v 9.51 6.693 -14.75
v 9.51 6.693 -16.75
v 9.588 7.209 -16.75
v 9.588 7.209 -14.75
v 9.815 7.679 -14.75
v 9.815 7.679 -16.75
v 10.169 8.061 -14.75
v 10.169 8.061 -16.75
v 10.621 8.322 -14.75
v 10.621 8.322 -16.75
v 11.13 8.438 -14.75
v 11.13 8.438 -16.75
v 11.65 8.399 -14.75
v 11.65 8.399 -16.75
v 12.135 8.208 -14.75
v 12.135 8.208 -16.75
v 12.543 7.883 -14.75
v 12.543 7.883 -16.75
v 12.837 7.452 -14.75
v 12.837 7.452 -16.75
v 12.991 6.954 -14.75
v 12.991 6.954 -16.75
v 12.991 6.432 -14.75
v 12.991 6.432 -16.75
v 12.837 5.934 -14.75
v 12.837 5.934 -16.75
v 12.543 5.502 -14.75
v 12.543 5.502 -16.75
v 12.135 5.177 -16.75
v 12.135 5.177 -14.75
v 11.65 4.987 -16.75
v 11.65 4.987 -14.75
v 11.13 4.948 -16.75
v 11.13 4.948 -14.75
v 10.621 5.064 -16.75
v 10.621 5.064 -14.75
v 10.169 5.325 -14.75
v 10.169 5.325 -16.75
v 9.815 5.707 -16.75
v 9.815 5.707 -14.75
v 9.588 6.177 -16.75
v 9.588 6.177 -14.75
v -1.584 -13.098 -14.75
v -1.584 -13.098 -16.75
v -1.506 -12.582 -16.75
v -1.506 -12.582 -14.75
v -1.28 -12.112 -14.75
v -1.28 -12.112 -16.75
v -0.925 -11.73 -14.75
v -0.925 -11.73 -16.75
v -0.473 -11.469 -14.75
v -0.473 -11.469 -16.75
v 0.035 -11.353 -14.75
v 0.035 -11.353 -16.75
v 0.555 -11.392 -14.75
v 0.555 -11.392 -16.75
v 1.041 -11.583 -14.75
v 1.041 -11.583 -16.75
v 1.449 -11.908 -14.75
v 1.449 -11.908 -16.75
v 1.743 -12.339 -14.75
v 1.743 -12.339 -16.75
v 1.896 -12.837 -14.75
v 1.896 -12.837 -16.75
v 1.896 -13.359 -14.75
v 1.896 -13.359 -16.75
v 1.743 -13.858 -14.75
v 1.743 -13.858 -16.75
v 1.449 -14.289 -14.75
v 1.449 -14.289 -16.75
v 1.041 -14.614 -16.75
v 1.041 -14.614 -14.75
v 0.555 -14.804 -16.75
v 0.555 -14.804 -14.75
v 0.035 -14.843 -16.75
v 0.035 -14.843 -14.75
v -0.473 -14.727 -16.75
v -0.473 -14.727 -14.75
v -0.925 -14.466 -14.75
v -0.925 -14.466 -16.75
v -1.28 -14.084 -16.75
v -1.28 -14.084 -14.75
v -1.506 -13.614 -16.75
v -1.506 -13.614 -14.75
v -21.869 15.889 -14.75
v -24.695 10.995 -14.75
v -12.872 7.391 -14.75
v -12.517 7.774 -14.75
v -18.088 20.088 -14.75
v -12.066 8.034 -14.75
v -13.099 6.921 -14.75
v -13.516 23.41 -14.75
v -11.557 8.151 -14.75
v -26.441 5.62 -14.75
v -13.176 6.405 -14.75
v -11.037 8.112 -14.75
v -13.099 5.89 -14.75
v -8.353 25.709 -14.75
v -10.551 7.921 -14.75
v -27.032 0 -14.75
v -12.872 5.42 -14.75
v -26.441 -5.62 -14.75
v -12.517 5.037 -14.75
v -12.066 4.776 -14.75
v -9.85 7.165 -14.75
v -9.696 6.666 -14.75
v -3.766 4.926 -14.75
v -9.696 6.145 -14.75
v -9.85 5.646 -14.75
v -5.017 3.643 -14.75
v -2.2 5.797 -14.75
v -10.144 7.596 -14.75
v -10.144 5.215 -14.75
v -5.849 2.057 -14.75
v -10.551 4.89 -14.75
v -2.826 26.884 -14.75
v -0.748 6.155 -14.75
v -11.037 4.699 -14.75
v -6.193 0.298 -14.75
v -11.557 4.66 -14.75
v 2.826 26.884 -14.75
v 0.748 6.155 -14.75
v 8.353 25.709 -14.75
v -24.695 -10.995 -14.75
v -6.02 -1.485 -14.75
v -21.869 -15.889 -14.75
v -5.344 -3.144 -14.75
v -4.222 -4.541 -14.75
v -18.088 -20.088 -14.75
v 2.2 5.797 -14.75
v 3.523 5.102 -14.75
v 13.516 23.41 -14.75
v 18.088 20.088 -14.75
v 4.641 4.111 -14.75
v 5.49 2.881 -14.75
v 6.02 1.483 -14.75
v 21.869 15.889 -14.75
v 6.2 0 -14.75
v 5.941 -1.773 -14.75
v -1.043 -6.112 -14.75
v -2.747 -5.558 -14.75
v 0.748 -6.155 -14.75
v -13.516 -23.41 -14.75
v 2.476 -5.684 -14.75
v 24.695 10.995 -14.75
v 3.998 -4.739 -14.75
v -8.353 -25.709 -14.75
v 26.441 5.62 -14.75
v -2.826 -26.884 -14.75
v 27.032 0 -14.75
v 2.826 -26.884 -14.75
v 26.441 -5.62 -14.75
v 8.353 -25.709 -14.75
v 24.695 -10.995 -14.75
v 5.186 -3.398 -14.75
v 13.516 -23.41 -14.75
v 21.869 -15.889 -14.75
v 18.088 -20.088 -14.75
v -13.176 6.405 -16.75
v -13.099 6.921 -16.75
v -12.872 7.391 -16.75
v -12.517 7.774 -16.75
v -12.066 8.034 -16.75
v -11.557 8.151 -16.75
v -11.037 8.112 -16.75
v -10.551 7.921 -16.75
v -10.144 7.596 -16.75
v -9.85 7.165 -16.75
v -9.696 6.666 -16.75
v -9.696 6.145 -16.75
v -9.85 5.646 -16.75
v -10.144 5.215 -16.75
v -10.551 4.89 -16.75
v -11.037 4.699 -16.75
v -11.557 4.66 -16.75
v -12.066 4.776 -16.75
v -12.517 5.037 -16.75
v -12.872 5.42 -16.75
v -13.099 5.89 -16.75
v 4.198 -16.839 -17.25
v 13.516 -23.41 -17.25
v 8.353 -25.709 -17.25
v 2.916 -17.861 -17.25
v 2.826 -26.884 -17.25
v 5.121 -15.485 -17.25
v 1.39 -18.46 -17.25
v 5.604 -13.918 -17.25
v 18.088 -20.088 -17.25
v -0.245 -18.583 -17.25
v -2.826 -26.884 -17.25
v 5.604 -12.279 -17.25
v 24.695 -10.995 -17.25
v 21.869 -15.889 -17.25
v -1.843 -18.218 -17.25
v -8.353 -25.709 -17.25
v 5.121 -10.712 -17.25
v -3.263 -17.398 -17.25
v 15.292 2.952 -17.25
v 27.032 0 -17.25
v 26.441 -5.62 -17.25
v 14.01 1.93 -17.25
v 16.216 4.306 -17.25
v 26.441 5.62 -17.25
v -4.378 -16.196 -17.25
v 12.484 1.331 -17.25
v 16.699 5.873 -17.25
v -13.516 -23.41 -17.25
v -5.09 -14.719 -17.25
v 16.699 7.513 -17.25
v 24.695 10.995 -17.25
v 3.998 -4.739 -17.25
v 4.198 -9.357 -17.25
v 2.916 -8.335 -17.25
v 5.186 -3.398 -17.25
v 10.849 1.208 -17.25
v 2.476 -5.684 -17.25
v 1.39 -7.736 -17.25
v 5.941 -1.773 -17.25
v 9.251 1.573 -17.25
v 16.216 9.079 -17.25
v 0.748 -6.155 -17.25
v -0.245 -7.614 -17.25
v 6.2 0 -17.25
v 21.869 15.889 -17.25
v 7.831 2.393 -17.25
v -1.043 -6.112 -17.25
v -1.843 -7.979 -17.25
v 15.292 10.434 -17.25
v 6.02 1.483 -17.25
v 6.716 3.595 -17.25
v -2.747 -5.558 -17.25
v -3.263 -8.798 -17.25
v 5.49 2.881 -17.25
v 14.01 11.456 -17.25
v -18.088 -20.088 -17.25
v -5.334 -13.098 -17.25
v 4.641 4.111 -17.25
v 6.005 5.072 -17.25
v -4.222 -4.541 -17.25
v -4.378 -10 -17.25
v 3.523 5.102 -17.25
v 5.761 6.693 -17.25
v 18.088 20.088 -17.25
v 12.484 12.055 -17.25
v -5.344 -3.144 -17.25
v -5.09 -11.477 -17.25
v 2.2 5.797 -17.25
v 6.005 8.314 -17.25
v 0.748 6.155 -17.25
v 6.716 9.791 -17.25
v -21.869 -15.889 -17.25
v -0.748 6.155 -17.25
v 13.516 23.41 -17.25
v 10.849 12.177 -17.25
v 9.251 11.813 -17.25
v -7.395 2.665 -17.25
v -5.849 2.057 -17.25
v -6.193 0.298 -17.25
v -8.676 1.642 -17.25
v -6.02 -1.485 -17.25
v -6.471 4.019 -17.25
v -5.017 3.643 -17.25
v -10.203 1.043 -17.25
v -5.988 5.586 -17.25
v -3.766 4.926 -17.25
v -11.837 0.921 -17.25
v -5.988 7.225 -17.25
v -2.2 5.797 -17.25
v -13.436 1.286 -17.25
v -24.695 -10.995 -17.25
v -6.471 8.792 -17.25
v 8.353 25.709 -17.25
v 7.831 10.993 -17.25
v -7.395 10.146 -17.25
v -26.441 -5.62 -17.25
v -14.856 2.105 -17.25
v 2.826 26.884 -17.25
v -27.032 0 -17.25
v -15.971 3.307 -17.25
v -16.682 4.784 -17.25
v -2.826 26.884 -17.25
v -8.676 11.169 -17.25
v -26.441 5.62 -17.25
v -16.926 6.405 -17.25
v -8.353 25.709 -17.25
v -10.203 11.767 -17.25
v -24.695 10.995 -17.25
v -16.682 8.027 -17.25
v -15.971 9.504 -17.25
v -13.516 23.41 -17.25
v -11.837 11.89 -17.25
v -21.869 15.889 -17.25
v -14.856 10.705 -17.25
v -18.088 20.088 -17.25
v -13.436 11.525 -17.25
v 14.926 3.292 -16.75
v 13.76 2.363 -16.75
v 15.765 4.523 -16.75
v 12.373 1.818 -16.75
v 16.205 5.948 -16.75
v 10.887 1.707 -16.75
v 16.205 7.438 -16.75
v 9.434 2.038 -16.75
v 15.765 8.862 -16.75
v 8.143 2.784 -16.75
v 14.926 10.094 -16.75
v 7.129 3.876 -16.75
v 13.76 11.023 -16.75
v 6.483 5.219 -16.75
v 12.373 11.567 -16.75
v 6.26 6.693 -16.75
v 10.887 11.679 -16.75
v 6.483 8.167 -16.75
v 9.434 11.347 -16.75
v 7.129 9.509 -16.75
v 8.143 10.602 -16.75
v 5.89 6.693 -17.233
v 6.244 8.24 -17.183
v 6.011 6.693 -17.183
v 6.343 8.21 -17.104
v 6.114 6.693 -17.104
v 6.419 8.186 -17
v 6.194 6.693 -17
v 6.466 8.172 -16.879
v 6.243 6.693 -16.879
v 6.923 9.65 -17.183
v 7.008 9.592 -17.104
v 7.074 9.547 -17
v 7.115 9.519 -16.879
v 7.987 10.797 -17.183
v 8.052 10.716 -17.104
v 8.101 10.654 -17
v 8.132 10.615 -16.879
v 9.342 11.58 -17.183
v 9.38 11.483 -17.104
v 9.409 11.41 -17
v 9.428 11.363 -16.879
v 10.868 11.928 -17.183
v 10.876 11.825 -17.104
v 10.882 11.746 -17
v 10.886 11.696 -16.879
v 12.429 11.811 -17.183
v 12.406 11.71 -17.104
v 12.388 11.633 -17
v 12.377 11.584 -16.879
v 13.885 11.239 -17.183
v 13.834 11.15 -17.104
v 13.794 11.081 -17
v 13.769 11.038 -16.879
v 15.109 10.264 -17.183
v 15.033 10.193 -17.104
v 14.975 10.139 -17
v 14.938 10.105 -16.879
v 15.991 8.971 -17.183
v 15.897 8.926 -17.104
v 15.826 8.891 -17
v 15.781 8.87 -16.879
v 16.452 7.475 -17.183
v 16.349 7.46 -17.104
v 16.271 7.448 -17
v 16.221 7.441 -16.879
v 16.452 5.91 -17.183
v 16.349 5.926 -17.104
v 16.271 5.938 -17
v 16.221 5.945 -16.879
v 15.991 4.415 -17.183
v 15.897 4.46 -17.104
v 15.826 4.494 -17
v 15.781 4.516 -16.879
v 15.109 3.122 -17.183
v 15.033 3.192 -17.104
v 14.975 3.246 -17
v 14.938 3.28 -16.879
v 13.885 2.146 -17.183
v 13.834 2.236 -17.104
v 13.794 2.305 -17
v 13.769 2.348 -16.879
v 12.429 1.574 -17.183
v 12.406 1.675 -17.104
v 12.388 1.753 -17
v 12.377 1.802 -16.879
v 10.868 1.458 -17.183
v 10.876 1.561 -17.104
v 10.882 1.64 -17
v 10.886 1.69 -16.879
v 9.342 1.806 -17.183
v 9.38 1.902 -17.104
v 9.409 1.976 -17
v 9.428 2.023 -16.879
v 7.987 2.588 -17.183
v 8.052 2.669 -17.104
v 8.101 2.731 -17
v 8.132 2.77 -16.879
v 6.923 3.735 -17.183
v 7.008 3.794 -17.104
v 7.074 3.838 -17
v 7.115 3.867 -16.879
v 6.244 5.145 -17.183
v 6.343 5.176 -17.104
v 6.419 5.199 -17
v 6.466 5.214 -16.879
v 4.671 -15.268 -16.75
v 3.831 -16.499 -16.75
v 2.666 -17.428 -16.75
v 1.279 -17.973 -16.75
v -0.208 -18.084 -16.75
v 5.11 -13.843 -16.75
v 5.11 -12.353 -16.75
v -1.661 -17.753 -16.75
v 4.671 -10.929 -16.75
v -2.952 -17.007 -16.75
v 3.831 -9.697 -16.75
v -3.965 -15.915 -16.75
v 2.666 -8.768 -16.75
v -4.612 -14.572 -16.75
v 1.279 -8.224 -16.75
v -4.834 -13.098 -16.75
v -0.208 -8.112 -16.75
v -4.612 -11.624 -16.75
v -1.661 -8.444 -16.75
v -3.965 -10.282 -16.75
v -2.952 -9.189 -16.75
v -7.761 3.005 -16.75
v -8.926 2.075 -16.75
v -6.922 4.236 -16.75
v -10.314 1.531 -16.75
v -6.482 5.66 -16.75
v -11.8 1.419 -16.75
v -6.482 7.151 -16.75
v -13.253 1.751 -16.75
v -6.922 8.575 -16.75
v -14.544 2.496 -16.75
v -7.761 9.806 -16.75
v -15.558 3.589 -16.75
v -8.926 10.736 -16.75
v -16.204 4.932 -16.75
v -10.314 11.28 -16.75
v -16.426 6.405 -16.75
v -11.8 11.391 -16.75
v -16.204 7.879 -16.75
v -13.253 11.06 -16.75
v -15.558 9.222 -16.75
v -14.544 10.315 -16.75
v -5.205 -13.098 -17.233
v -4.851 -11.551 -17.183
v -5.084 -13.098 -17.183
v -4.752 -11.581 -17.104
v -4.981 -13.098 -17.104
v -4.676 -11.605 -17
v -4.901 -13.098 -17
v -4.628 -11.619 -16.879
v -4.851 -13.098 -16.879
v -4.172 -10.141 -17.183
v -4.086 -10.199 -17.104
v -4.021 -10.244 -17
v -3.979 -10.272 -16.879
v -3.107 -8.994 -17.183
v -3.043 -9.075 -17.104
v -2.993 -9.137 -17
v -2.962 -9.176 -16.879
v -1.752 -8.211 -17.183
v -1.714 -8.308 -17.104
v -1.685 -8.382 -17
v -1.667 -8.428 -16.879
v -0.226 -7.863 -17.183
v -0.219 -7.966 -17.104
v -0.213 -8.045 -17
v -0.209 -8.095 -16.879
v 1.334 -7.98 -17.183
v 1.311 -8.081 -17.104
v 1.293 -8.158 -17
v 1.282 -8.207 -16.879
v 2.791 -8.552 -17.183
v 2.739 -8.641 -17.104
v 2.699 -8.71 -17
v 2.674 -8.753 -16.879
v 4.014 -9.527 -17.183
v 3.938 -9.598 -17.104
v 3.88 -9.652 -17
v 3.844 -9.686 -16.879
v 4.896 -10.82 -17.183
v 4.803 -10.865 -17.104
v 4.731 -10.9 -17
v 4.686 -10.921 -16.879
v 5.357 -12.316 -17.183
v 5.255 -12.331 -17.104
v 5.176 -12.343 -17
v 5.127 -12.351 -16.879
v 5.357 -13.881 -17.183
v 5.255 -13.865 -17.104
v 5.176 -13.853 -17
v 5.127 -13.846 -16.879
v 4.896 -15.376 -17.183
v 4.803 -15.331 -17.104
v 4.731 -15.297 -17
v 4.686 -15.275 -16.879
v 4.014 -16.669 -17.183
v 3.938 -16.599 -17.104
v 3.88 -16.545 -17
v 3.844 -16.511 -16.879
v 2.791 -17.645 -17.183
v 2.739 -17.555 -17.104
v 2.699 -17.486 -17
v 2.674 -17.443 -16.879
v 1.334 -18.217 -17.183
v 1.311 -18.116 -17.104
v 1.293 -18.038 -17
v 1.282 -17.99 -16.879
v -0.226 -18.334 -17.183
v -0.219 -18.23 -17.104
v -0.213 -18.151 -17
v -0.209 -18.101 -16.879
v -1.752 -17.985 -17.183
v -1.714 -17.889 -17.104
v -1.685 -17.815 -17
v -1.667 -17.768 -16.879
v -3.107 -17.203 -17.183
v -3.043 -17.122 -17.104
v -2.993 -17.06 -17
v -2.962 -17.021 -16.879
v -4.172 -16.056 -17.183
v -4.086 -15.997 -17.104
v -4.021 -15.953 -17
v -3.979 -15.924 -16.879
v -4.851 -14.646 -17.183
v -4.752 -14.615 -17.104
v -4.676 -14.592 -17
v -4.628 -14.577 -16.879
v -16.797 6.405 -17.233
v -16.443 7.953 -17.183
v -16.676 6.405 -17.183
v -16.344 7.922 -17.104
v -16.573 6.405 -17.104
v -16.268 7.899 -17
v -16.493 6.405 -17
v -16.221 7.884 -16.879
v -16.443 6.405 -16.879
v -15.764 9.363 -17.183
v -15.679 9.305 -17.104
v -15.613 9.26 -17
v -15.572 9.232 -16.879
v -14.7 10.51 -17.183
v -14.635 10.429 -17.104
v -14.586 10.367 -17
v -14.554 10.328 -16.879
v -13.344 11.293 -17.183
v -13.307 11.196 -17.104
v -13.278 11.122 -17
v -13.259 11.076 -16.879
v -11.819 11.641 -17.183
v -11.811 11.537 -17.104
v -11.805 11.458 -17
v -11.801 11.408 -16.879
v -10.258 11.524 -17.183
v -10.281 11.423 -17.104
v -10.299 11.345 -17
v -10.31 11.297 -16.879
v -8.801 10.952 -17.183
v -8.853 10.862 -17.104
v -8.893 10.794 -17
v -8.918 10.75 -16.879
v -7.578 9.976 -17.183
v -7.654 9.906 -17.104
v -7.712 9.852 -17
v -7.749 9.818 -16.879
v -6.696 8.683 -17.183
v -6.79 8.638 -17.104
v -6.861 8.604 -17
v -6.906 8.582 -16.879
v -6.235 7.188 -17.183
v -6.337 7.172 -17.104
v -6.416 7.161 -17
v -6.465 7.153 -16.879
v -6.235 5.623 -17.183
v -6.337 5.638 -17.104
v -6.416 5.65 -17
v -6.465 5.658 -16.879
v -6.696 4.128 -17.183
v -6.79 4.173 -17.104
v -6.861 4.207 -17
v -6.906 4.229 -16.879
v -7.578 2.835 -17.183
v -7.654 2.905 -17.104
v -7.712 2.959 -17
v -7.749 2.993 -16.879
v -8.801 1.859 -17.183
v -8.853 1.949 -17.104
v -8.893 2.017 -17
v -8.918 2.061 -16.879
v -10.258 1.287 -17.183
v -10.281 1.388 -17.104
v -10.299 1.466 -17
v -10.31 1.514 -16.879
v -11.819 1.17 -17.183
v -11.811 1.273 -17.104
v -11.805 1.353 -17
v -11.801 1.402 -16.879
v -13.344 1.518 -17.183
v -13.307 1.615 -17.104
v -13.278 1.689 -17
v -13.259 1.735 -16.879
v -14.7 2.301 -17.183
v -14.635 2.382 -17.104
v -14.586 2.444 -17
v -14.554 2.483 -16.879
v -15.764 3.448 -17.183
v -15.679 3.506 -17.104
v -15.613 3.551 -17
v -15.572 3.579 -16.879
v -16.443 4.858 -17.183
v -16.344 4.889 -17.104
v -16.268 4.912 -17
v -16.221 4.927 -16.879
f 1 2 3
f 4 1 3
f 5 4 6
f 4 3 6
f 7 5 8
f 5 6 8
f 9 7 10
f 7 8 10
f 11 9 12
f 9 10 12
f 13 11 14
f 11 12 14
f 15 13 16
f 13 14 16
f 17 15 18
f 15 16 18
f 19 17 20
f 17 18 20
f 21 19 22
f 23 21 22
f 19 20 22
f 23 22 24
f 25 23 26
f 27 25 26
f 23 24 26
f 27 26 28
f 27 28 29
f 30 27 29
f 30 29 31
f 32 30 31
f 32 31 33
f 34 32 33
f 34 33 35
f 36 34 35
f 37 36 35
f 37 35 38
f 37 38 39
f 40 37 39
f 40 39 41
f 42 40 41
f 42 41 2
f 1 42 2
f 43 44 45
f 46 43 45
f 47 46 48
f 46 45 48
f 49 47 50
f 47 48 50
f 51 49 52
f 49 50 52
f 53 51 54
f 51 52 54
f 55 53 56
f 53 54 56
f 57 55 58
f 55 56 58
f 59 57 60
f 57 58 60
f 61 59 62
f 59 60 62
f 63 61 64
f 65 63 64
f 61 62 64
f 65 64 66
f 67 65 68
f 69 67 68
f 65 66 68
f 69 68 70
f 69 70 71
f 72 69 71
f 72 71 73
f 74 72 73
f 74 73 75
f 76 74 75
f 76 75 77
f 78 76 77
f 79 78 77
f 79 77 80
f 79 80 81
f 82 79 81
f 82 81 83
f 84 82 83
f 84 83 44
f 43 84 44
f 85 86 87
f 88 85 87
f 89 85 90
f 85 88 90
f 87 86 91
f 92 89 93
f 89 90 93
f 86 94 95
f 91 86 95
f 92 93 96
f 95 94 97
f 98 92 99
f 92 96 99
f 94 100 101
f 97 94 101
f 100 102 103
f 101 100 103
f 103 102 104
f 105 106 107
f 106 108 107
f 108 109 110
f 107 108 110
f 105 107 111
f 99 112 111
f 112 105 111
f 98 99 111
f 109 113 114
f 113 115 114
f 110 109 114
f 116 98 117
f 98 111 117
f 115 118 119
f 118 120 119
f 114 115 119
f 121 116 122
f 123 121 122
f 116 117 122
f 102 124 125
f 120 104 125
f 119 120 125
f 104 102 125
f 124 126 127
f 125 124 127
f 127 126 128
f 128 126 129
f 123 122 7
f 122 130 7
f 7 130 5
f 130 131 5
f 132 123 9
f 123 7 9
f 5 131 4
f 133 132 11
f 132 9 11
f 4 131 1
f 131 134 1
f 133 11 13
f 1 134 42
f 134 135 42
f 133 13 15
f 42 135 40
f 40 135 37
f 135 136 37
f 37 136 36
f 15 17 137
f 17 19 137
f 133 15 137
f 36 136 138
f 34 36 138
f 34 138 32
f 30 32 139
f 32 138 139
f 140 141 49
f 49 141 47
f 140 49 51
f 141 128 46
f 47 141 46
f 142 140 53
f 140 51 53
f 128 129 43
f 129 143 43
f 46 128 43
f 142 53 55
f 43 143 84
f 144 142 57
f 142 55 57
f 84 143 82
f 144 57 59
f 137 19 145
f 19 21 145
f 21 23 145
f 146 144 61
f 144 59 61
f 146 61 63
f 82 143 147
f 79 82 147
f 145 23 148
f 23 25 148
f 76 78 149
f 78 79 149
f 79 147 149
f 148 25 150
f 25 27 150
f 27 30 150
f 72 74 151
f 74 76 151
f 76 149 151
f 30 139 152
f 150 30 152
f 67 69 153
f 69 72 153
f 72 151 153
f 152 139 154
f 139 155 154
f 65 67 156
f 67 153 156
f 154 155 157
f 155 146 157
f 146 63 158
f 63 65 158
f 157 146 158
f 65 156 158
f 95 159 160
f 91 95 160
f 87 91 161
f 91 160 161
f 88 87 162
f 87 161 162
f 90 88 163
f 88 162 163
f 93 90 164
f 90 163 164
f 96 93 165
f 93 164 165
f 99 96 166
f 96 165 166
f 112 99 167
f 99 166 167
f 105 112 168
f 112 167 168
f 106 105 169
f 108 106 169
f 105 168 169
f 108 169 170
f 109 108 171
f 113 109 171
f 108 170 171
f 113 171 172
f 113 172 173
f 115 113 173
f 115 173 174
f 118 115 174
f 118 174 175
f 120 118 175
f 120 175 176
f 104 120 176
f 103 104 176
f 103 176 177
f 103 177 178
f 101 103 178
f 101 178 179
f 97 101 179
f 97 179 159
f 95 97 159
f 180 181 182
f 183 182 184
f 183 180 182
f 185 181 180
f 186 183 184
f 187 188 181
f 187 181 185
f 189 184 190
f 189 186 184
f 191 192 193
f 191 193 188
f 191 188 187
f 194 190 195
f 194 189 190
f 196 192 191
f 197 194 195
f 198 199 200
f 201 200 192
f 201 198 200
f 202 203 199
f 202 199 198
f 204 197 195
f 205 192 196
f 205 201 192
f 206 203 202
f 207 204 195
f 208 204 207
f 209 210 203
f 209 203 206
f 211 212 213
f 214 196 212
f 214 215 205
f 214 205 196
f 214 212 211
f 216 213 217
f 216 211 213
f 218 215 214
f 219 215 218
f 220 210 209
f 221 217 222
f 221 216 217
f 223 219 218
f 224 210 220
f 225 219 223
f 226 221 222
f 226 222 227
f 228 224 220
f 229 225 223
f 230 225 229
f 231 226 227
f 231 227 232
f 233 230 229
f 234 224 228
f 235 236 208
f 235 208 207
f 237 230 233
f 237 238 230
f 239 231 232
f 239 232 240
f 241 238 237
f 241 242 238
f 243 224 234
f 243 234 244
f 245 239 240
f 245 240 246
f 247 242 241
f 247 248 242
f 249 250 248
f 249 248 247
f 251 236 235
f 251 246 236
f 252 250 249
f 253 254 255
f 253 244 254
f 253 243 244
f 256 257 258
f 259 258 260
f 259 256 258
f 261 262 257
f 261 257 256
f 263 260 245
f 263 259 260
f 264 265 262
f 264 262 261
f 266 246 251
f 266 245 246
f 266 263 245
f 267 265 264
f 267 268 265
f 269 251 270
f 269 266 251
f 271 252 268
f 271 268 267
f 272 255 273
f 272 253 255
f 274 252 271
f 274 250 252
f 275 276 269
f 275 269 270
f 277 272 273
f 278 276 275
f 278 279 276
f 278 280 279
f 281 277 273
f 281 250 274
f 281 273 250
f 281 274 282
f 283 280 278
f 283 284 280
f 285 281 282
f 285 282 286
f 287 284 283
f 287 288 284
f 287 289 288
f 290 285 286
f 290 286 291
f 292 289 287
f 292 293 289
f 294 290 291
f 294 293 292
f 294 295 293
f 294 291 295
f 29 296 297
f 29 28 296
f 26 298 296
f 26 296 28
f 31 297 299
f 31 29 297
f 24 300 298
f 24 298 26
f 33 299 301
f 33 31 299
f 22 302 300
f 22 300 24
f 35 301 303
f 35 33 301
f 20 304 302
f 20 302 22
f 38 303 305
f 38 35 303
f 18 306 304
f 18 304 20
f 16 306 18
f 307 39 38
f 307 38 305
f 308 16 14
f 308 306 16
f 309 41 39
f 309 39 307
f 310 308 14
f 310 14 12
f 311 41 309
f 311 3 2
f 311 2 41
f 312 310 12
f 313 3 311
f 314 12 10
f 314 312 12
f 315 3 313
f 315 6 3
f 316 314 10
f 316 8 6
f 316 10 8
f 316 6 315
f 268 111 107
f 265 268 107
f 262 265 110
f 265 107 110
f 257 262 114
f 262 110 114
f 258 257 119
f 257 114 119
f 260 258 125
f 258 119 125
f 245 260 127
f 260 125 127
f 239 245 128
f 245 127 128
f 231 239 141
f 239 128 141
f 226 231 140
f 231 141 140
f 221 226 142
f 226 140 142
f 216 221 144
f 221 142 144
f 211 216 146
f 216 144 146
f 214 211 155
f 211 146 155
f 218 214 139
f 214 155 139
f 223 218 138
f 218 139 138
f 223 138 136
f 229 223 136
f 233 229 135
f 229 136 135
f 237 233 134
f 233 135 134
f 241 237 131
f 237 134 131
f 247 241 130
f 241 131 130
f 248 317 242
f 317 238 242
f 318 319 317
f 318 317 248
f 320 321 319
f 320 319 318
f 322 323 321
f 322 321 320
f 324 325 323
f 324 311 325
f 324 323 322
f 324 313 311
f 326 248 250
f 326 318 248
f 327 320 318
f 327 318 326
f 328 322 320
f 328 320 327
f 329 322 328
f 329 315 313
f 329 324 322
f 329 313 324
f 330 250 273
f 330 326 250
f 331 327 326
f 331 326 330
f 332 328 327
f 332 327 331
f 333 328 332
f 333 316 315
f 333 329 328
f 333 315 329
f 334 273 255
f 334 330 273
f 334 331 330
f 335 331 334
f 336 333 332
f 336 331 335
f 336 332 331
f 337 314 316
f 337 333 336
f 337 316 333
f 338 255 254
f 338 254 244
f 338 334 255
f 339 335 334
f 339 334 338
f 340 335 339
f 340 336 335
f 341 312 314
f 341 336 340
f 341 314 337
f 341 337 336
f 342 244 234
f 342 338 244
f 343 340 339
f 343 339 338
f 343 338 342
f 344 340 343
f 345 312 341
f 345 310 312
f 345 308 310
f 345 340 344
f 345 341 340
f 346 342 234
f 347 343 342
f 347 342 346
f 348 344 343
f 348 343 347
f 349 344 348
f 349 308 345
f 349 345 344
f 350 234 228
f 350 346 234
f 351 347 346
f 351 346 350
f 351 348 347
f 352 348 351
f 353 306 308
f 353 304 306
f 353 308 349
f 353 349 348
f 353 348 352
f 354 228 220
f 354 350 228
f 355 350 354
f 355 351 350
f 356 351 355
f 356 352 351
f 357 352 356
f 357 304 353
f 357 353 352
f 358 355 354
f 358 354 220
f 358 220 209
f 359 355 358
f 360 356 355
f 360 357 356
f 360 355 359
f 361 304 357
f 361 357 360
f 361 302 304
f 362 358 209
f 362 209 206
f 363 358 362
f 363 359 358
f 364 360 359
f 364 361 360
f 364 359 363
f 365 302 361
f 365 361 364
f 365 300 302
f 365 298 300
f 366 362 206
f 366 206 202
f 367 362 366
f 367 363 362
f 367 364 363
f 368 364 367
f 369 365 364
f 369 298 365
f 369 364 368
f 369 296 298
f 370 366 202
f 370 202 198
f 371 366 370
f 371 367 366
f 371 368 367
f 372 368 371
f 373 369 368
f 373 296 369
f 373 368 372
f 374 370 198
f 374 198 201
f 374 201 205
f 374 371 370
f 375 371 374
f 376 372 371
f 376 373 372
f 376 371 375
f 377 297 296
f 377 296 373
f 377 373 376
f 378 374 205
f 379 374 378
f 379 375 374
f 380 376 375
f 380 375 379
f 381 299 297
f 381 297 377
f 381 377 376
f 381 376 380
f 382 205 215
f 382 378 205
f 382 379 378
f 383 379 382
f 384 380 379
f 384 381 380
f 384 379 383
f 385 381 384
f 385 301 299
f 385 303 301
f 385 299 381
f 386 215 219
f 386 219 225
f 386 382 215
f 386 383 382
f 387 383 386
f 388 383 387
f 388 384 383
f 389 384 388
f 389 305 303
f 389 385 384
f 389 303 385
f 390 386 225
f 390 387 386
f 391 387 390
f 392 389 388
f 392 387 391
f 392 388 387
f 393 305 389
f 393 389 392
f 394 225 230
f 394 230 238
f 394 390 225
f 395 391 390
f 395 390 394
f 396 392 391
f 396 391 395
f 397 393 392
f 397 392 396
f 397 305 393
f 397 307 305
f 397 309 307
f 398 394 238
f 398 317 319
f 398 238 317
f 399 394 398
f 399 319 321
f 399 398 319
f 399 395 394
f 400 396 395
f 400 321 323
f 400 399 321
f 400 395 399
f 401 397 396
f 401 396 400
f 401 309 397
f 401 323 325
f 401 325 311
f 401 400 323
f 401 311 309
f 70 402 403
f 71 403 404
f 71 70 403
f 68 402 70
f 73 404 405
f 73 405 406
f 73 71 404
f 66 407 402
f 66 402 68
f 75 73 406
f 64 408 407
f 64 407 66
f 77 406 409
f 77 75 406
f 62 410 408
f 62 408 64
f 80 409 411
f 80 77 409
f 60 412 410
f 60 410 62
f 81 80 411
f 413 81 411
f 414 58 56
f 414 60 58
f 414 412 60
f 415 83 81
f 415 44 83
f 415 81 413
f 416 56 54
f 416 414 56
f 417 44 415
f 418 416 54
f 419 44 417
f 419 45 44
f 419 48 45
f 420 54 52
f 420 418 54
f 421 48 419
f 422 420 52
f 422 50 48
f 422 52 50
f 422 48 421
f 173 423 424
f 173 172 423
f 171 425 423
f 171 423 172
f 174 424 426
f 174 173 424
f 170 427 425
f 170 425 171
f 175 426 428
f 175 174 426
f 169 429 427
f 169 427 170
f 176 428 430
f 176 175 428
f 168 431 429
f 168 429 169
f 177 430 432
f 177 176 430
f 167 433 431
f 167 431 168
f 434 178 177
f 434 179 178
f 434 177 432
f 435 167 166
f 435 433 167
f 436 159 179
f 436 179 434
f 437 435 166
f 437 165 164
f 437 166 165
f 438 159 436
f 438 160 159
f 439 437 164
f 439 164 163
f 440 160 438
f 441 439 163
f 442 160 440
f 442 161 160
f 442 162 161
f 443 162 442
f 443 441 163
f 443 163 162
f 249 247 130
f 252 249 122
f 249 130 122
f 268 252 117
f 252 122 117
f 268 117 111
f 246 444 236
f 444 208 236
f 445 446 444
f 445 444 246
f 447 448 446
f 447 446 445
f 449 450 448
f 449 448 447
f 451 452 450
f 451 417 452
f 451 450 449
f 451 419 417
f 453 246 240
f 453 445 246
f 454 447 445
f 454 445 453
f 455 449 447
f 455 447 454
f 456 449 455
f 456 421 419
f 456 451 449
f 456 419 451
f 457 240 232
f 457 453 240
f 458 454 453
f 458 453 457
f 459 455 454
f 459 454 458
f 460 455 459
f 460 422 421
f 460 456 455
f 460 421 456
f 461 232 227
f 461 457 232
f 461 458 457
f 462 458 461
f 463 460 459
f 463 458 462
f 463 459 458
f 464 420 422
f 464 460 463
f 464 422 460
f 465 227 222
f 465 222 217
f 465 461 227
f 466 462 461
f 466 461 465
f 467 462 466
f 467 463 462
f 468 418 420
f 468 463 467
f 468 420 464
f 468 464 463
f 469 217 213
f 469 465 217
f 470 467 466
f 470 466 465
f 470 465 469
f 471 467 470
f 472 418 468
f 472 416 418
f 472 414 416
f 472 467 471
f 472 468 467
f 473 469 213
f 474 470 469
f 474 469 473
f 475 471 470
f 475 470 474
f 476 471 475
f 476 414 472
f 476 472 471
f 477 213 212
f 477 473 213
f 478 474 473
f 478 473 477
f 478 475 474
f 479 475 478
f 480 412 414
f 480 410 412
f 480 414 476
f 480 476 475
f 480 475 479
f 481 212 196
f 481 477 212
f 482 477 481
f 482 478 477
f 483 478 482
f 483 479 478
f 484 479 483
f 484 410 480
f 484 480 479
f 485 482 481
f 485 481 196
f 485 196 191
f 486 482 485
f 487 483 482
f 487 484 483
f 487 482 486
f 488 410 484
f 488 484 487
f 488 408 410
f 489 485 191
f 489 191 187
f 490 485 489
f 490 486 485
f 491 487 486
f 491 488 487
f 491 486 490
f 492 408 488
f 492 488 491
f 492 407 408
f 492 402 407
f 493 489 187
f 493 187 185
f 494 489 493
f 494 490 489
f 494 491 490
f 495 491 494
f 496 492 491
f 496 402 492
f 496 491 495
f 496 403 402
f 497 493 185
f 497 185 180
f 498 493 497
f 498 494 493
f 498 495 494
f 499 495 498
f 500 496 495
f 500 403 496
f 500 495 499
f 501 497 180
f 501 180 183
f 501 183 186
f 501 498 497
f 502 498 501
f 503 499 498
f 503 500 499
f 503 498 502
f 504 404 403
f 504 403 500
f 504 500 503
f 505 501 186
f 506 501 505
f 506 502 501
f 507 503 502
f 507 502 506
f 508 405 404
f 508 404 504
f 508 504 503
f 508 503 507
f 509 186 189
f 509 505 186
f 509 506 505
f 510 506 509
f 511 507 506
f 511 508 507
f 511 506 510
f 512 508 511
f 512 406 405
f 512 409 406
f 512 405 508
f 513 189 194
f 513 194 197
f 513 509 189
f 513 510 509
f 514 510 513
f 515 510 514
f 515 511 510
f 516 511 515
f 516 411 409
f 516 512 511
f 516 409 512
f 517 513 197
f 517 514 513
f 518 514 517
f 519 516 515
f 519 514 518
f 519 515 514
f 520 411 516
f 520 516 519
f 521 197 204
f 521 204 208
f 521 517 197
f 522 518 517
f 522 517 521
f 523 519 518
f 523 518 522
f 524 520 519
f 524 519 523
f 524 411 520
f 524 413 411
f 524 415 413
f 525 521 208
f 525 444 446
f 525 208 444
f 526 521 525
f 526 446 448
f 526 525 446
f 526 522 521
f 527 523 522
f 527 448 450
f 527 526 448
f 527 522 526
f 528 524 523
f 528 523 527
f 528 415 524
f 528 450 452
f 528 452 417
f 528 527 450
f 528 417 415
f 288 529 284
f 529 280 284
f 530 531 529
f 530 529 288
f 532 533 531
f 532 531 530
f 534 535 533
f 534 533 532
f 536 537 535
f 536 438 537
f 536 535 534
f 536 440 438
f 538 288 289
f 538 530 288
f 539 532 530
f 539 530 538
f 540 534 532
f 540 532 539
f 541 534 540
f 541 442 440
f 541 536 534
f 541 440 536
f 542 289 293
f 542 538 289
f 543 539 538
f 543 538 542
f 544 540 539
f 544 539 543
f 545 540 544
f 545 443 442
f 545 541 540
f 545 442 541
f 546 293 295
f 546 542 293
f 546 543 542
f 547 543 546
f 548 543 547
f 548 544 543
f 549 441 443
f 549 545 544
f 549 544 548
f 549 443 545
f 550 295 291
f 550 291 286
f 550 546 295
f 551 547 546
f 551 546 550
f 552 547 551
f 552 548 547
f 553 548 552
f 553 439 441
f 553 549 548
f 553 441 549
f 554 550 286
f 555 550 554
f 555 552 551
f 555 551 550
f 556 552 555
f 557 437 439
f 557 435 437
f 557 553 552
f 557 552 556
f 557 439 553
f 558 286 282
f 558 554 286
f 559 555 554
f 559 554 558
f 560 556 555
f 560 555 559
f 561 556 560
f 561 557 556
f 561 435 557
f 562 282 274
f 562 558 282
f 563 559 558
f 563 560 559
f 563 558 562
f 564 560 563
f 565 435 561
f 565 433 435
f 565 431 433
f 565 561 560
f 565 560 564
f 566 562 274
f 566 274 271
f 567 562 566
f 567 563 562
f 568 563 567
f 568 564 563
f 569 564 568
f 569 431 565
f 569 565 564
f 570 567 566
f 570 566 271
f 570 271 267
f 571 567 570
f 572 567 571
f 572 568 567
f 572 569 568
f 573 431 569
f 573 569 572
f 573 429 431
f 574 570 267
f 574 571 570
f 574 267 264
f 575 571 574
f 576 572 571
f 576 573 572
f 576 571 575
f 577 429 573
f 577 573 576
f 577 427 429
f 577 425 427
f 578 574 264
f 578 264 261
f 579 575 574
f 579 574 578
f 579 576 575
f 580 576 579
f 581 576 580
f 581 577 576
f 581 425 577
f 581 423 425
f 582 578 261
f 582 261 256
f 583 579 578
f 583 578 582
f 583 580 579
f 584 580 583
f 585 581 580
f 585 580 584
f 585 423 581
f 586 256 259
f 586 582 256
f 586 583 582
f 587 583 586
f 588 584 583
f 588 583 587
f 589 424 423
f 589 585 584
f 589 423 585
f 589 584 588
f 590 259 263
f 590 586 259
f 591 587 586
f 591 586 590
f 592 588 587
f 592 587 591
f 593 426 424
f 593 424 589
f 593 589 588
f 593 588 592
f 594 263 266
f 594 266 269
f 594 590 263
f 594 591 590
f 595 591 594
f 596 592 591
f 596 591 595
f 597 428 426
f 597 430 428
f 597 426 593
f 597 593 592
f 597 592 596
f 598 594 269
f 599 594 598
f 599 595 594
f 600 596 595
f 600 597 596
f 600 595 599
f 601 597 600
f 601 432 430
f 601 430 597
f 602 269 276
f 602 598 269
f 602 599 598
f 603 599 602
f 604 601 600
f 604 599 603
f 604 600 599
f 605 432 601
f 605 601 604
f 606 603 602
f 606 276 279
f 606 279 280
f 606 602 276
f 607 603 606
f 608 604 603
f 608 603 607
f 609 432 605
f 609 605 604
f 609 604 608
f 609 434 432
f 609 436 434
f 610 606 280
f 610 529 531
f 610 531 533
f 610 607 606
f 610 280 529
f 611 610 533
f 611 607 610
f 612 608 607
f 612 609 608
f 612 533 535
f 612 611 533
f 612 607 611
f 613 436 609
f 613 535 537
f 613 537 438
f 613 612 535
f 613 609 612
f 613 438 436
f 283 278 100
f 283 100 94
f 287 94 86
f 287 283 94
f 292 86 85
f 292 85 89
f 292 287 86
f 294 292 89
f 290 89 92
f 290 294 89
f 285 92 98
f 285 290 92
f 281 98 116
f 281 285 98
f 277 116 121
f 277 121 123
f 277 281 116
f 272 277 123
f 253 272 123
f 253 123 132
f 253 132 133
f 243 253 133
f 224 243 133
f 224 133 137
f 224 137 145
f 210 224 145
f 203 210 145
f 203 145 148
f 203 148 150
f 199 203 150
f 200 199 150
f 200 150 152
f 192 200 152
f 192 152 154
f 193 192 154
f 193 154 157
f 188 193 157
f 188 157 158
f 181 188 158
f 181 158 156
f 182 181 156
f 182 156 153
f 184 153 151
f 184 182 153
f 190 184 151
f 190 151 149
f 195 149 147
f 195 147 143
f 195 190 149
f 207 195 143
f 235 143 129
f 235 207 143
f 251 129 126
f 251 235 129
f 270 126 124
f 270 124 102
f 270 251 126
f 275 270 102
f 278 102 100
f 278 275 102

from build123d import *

# Parameters (mm, degrees)
BOSS_EXTRUDE1_DEPTH      = 7.25
BOSS_EXTRUDE1_DEPTH_BACK = 7.25
SKETCH7_R                = 22.031647778
CUT_EXTRUDE3_DEPTH       = 36.98314894
CUT_EXTRUDE3_DEPTH_BACK  = 36.98314894
SKETCH15_R               = 8.008120878
SKETCH15_R_2             = 2.25
BOSS_EXTRUDE2_DEPTH      = 5.5
SKETCH16_R               = 5
CUT_EXTRUDE4_DEPTH       = 3
BOSS_EXTRUDE3_START      = 7.5
SKETCH17_R               = 22.031647778
SKETCH17_R_2             = 5
BOSS_EXTRUDE3_DEPTH      = 7.5
CUT_EXTRUDE2_DEPTH       = 36.98314894
CUT_EXTRUDE2_DEPTH_BACK  = 36.98314894
FILLET2_R                = 0.51
BOSS_EXTRUDE4_START      = 2.5
SKETCH18_R               = 27.031647778
SKETCH18_R_2             = 22.031647778
SKETCH18_R_3             = 5
BOSS_EXTRUDE4_DEPTH      = 2.5
BOSS_EXTRUDE5_START      = -2.5
SKETCH19_R               = 27.031647778
SKETCH19_R_2             = 19
BOSS_EXTRUDE5_DEPTH      = 2.5
CUT_EXTRUDE5_DEPTH       = 52.999831377
SKETCH21_R               = 8.008120878
SKETCH21_R_2             = 6.2
SKETCH21_R_3             = 2.25
BOSS_EXTRUDE6_DEPTH      = 2.5
SKETCH21_4_R             = 8.008120878
SKETCH21_4_R_2           = 6.2
BOSS_EXTRUDE7_DEPTH      = 12
CUT_EXTRUDE6_DEPTH       = 43.254230122
CUT_EXTRUDE6_DEPTH_BACK  = 43.254230122
SKETCH22_W               = 54.063295556
SKETCH22_H               = 32.75
SKETCH24_R               = 1.75
CUT_EXTRUDE7_DEPTH       = 39.310180934
SKETCH24_3_R             = 5
SKETCH24_3_R_2           = 1.75
CUT_EXTRUDE8_DEPTH       = 0.5
FILLET4_R                = 0.5


with BuildPart() as part:
    # Sketch7 → Boss-Extrude1 (new, two sides: drawn at the far end of the back side and taken through both)
    with BuildSketch(Plane.XY.offset(-BOSS_EXTRUDE1_DEPTH_BACK)):
        Circle(SKETCH7_R)
    extrude(amount=BOSS_EXTRUDE1_DEPTH + BOSS_EXTRUDE1_DEPTH_BACK)

    # Sketch14 → Revolve1 (revolve)
    with BuildSketch(Plane(origin=(0, 0, 0), x_dir=(0, 0, -1), z_dir=(1, 0, 0)), mode=Mode.PRIVATE) as revolve1_sk:
        Polygon((-18, 6.739517467), (-18, 0), (0, 0), (0, 19), (-3.355534752, 19), (-11.020158508, 12.583105693), align=None)
        with BuildLine():
            ThreePointArc((-7.25, 19), (-8.580081567, 15.465471544), (-11.020158508, 12.583105693))
            Line((-11.020158508, 12.583105693), (-3.355534752, 19))
            Line((-3.355534752, 19), (-7.25, 19))
        make_face()
        with BuildLine():
            Line((-18, 10), (-18, 6.739517467))
            Line((-18, 6.739517467), (-11.020158508, 12.583105693))
            ThreePointArc((-11.020158508, 12.583105693), (-14.286666254, 10.687865845), (-18, 10))
        make_face()
    revolve(revolve1_sk.sketch.rotate(Axis((0, 0, -36.129595921), (0, 0, 1)), 270), axis=Axis((0, 0, -36.129595921), (0, 0, 1)))

    # Sketch10 → Cut-Extrude3 (cut, two sides: drawn at the far end of the back side and taken through both)
    with BuildSketch(Plane.XY.offset(-CUT_EXTRUDE3_DEPTH_BACK)):
        with BuildLine():
            Line((2.2, 7.7), (-2.2, 7.7))
            Line((-2.2, 7.7), (-2.2, 5.796550698))
            ThreePointArc((-2.2, 5.796550698), (0, 6.2), (2.2, 5.796550698))
            Line((2.2, 5.796550698), (2.2, 7.7))
        make_face()
        with BuildLine():
            ThreePointArc((2.2, 5.796550698), (0, 6.2), (-2.2, 5.796550698))
            Line((-2.2, 5.796550698), (-2.2, 0))
            Line((-2.2, 0), (2.2, 0))
            Line((2.2, 0), (2.2, 5.796550698))
        make_face()
        with BuildLine():
            Line((-2.2, 0), (-2.2, 5.796550698))
            ThreePointArc((-2.2, 5.796550698), (-3.521363372, -5.102940329), (6.2, 0))
            ThreePointArc((6.2, 0), (5.102940329, 3.521363372), (2.2, 5.796550698))
            Line((2.2, 5.796550698), (2.2, 0))
            Line((2.2, 0), (-2.2, 0))
        make_face()
    extrude(amount=CUT_EXTRUDE3_DEPTH + CUT_EXTRUDE3_DEPTH_BACK, mode=Mode.SUBTRACT)

    # Sketch15 → Boss-Extrude2 (add)
    with BuildSketch(Plane(origin=(0, 0, -7.25), x_dir=(-1, 0, 0), z_dir=(0, 0, -1))):
        Circle(SKETCH15_R)
        Circle(SKETCH15_R_2, mode=Mode.SUBTRACT)
    extrude(amount=-BOSS_EXTRUDE2_DEPTH)

    # Sketch16 → Cut-Extrude4 (cut)
    with BuildSketch(Plane(origin=(0, 0, -7.25), x_dir=(-1, 0, 0), z_dir=(0, 0, -1))):
        Circle(SKETCH16_R)
    extrude(amount=-CUT_EXTRUDE4_DEPTH, mode=Mode.SUBTRACT)

    # Sketch17 → Boss-Extrude3 (add)
    with BuildSketch(Plane(origin=(0, 0, -7.25), x_dir=(-1, 0, 0), z_dir=(0, 0, -1)).offset(BOSS_EXTRUDE3_START)):
        with Locations(Location((0, 0, 0), (0, 0, 180))):
            Circle(SKETCH17_R)
        Circle(SKETCH17_R_2, mode=Mode.SUBTRACT)
    extrude(amount=-BOSS_EXTRUDE3_DEPTH)

    # Sketch8 → Cut-Extrude2 (cut, two sides: drawn at the far end of the back side and taken through both)
    with BuildSketch(Plane.XY.offset(-CUT_EXTRUDE2_DEPTH_BACK)):
        Polygon((-1.629816853, 19.998625671), (-2.369776385, 22.031647778), (2.369776385, 22.031647778), (1.629816853, 19.998625671), align=None)
        Polygon((6.645262089, 18.932559877), (6.796180007, 21.090786644), (11.125976911, 19.16303686), (9.623085654, 17.606747406), align=None)
        Polygon((13.771314846, 14.592882482), (14.787015134, 16.503136895), (17.958394952, 12.980962779), (15.952435523, 12.170502561), align=None)
        Polygon((18.516182157, 7.729963135), (20.221041008, 9.061944851), (21.68564336, 4.554362304), (19.523464367, 4.629867259), align=None)
        Polygon((20.059433359, -0.469537064), (22.15866519, 0.053860216), (21.663247022, -4.659728787), (19.718708857, -3.711314154), align=None)
        Polygon((18.134226299, -8.587850038), (20.264854855, -8.963537338), (17.89507847, -13.06811044), (16.504409446, -11.410775634), align=None)
        Polygon((13.073446767, -15.221245722), (14.867067016, -16.431057856), (11.032688279, -19.216897077), (10.436347704, -17.137210342), align=None)
        Polygon((5.752149521, -19.222749741), (6.898628226, -21.057499199), (2.262646056, -22.042907629), (2.563746633, -19.900465696), align=None)
        Polygon((-2.563746633, -19.900465696), (-2.262646056, -22.042907629), (-6.898628226, -21.057499199), (-5.752149521, -19.222749741), align=None)
        Polygon((-10.436347704, -17.137210342), (-11.032688279, -19.216897077), (-14.867067016, -16.431057856), (-13.073446767, -15.221245722), align=None)
        Polygon((-16.504409446, -11.410775634), (-17.89507847, -13.06811044), (-20.264854855, -8.963537338), (-18.134226299, -8.587850038), align=None)
        Polygon((-19.718708857, -3.711314154), (-21.663247022, -4.659728787), (-22.15866519, 0.053860216), (-20.059433359, -0.469537064), align=None)
        Polygon((-19.523464367, 4.629867259), (-21.68564336, 4.554362304), (-20.221041008, 9.061944851), (-18.516182157, 7.729963135), align=None)
        Polygon((-15.952435523, 12.170502561), (-17.958394952, 12.980962779), (-14.787015134, 16.503136895), (-13.771314846, 14.592882482), align=None)
        Polygon((-9.623085654, 17.606747406), (-11.125976911, 19.16303686), (-6.796180007, 21.090786644), (-6.645262089, 18.932559877), align=None)
    extrude(amount=CUT_EXTRUDE2_DEPTH + CUT_EXTRUDE2_DEPTH_BACK, mode=Mode.SUBTRACT)

    # Fillet2
    fillet2_edges = [part.edges().sort_by_distance(p)[0] for p in [
        (6.787047671, 20.960188161, -3.75),
        (11.035034049, 19.06886277, -3.75),
        (9.623085654, 17.606747406, -3.75),
        (6.645262089, 18.932559877, -3.75),
        (14.725553141, 16.387543699, -3.75),
        (17.837010461, 12.931920261, -3.75),
        (15.952435523, 12.170502561, -3.75),
        (13.771314846, 14.592882482, -3.75),
        (20.117876696, 8.981344056, -3.75),
        (21.55480572, 4.558931255, -3.75),
        (19.523464367, 4.629867259, -3.75),
        (18.516182157, 7.729963135, -3.75),
        (22.031636605, 0.022188433, -3.75),
        (21.545579251, -4.60233838, -3.75),
        (19.718708857, -3.711314154, -3.75),
        (20.059433359, -0.469537064, -3.75),
        (20.135926394, -8.940803772, -3.75),
        (17.810926394, -12.9678219, -3.75),
        (16.504409446, -11.410775634, -3.75),
        (18.134226299, -8.587850038, -3.75),
        (14.75853158, -16.35784978, -3.75),
        (10.996602556, -19.091051203, -3.75),
        (10.436347704, -17.137210342, -3.75),
        (13.073446767, -15.221245722, -3.75),
        (6.829252579, -20.946474955, -3.75),
        (2.280866235, -21.913264317, -3.75),
        (2.563746633, -19.900465696, -3.75),
        (5.752149521, -19.222749741, -3.75),
        (-2.280866235, -21.913264317, -3.75),
        (-6.829252579, -20.946474955, -3.75),
        (-5.752149521, -19.222749741, -3.75),
        (-2.563746633, -19.900465696, -3.75),
        (-10.996602556, -19.091051203, -3.75),
        (-14.75853158, -16.35784978, -3.75),
        (-13.073446767, -15.221245722, -3.75),
        (-10.436347704, -17.137210342, -3.75),
        (-17.810926394, -12.9678219, -3.75),
        (-20.135926394, -8.940803772, -3.75),
        (-18.134226299, -8.587850038, -3.75),
        (-16.504409446, -11.410775634, -3.75),
        (-21.545579251, -4.60233838, -3.75),
        (-22.031636605, 0.022188433, -3.75),
        (-20.059433359, -0.469537064, -3.75),
        (-19.718708857, -3.711314154, -3.75),
        (-21.55480572, 4.558931255, -3.75),
        (-20.117876696, 8.981344056, -3.75),
        (-18.516182157, 7.729963135, -3.75),
        (-19.523464367, 4.629867259, -3.75),
        (-17.837010461, 12.931920261, -3.75),
        (-14.725553141, 16.387543699, -3.75),
        (-13.771314846, 14.592882482, -3.75),
        (-15.952435523, 12.170502561, -3.75),
        (-11.035034049, 19.06886277, -3.75),
        (-6.787047671, 20.960188161, -3.75),
        (-6.645262089, 18.932559877, -3.75),
        (-9.623085654, 17.606747406, -3.75),
        (-2.325, 21.908625671, -3.75),
        (2.325, 21.908625671, -3.75),
        (1.629816853, 19.998625671, -3.75),
        (-1.629816853, 19.998625671, -3.75),
    ]]
    fillet(fillet2_edges, radius=FILLET2_R)

    # Sketch18 → Boss-Extrude4 (add)
    # profile 1 of 2: a face of its own
    with BuildSketch(Plane(origin=(0, 0, -14.75), x_dir=(-1, 0, 0), z_dir=(0, 0, -1)).offset(BOSS_EXTRUDE4_START)):
        Circle(SKETCH18_R)
        Circle(SKETCH18_R_2, mode=Mode.SUBTRACT)
    # profile 2 of 2: a face of its own
    with BuildSketch(Plane(origin=(0, 0, -14.75), x_dir=(-1, 0, 0), z_dir=(0, 0, -1)).offset(BOSS_EXTRUDE4_START)):
        Circle(SKETCH18_R_2)
        Circle(SKETCH18_R_3, mode=Mode.SUBTRACT)
    extrude(amount=-BOSS_EXTRUDE4_DEPTH)

    # Sketch19 → Boss-Extrude5 (add)
    with BuildSketch(Plane.XY.offset(7.25).offset(BOSS_EXTRUDE5_START)):
        with Locations(Location((0, 0, 0), (0, 0, 180))):
            Circle(SKETCH19_R)
        Circle(SKETCH19_R_2, mode=Mode.SUBTRACT)
    extrude(amount=BOSS_EXTRUDE5_DEPTH)

    # Sketch20 → Cut-Extrude5 (cut, through all)
    with BuildSketch(Plane.XY.offset(18)):
        with BuildLine():
            Line((-2.2, 7.7), (-2.2, 5.796550698))
            ThreePointArc((-2.2, 5.796550698), (0, 6.2), (2.2, 5.796550698))
            Line((2.2, 5.796550698), (2.2, 7.7))
            Line((2.2, 7.7), (-2.2, 7.7))
        make_face()
        with BuildLine():
            ThreePointArc((2.2, 5.796550698), (0, 6.2), (-2.2, 5.796550698))
            ThreePointArc((-2.2, 5.796550698), (-3.521363372, -5.102940329), (6.2, 0))
            ThreePointArc((6.2, 0), (5.102940329, 3.521363372), (2.2, 5.796550698))
        make_face()
    extrude(amount=-CUT_EXTRUDE5_DEPTH, mode=Mode.SUBTRACT)

    # Sketch21 → Boss-Extrude6 (add)
    # profile 1 of 2: a face of its own
    with BuildSketch(Plane.XY.offset(-5.25)):
        Circle(SKETCH21_R)
        Circle(SKETCH21_R_2, mode=Mode.SUBTRACT)
    # profile 2 of 2: a face of its own
    with BuildSketch(Plane.XY.offset(-5.25)):
        Circle(SKETCH21_R_2)
        Circle(SKETCH21_R_3, mode=Mode.SUBTRACT)
    extrude(amount=-BOSS_EXTRUDE6_DEPTH)

    # Sketch21<4> → Boss-Extrude7 (add)
    with BuildSketch(Plane.XY.offset(-5.25)):
        Circle(SKETCH21_4_R)
        Circle(SKETCH21_4_R_2, mode=Mode.SUBTRACT)
    extrude(amount=-BOSS_EXTRUDE7_DEPTH)

    # Sketch22 → Cut-Extrude6 (cut, two sides: drawn at the far end of the back side and taken through both)
    with BuildSketch(Plane(origin=(0, 0, 0), x_dir=(1, 0, 0), z_dir=(0, 1, 0)).offset(-CUT_EXTRUDE6_DEPTH_BACK)):
        with Locations((0, -1.625)):
            Rectangle(SKETCH22_W, SKETCH22_H)
    extrude(amount=CUT_EXTRUDE6_DEPTH + CUT_EXTRUDE6_DEPTH_BACK, mode=Mode.SUBTRACT)

    # Sketch24 → Cut-Extrude7 (cut, through all)
    with BuildSketch(Plane(origin=(0, 0, -17.25), x_dir=(-1, 0, 0), z_dir=(0, 0, -1))):
        with Locations((11.42637589, 6.405461013)):
            Circle(SKETCH24_R)
        with Locations((-0.165895985, -13.0982623)):
            Circle(SKETCH24_R)
        with Locations((-11.260479905, 6.692801288)):
            Circle(SKETCH24_R)
    extrude(amount=-CUT_EXTRUDE7_DEPTH, mode=Mode.SUBTRACT)

    # Sketch24<3> → Cut-Extrude8 (cut)
    # profile 1 of 3: a face of its own
    with BuildSketch(Plane(origin=(0, 0, -17.25), x_dir=(-1, 0, 0), z_dir=(0, 0, -1))):
        with Locations((-11.260479905, 6.692801288)):
            Circle(SKETCH24_3_R)
        with Locations((-11.260479905, 6.692801288)):
            Circle(SKETCH24_3_R_2, mode=Mode.SUBTRACT)
    # profile 2 of 3: a face of its own
    with BuildSketch(Plane(origin=(0, 0, -17.25), x_dir=(-1, 0, 0), z_dir=(0, 0, -1))):
        with Locations((11.42637589, 6.405461013)):
            Circle(SKETCH24_3_R)
        with Locations((11.42637589, 6.405461013)):
            Circle(SKETCH24_3_R_2, mode=Mode.SUBTRACT)
    # profile 3 of 3: a face of its own
    with BuildSketch(Plane(origin=(0, 0, -17.25), x_dir=(-1, 0, 0), z_dir=(0, 0, -1))):
        with Locations((-0.165895985, -13.0982623)):
            Circle(SKETCH24_3_R)
        with Locations((-0.165895985, -13.0982623)):
            Circle(SKETCH24_3_R_2, mode=Mode.SUBTRACT)
    extrude(amount=-CUT_EXTRUDE8_DEPTH, mode=Mode.SUBTRACT)

    # Fillet4
    fillet4_edges = [part.edges().sort_by_distance(p)[0] for p in [
        (16.260479905, 6.692801288, -17.25),
        (-6.42637589, 6.405461013, -17.25),
        (5.165895985, -13.0982623, -17.25),
    ]]
    fillet(fillet4_edges, radius=FILLET4_R - 0.0001)  # a hair under: the kernel refuses the full size


solid = part.part
